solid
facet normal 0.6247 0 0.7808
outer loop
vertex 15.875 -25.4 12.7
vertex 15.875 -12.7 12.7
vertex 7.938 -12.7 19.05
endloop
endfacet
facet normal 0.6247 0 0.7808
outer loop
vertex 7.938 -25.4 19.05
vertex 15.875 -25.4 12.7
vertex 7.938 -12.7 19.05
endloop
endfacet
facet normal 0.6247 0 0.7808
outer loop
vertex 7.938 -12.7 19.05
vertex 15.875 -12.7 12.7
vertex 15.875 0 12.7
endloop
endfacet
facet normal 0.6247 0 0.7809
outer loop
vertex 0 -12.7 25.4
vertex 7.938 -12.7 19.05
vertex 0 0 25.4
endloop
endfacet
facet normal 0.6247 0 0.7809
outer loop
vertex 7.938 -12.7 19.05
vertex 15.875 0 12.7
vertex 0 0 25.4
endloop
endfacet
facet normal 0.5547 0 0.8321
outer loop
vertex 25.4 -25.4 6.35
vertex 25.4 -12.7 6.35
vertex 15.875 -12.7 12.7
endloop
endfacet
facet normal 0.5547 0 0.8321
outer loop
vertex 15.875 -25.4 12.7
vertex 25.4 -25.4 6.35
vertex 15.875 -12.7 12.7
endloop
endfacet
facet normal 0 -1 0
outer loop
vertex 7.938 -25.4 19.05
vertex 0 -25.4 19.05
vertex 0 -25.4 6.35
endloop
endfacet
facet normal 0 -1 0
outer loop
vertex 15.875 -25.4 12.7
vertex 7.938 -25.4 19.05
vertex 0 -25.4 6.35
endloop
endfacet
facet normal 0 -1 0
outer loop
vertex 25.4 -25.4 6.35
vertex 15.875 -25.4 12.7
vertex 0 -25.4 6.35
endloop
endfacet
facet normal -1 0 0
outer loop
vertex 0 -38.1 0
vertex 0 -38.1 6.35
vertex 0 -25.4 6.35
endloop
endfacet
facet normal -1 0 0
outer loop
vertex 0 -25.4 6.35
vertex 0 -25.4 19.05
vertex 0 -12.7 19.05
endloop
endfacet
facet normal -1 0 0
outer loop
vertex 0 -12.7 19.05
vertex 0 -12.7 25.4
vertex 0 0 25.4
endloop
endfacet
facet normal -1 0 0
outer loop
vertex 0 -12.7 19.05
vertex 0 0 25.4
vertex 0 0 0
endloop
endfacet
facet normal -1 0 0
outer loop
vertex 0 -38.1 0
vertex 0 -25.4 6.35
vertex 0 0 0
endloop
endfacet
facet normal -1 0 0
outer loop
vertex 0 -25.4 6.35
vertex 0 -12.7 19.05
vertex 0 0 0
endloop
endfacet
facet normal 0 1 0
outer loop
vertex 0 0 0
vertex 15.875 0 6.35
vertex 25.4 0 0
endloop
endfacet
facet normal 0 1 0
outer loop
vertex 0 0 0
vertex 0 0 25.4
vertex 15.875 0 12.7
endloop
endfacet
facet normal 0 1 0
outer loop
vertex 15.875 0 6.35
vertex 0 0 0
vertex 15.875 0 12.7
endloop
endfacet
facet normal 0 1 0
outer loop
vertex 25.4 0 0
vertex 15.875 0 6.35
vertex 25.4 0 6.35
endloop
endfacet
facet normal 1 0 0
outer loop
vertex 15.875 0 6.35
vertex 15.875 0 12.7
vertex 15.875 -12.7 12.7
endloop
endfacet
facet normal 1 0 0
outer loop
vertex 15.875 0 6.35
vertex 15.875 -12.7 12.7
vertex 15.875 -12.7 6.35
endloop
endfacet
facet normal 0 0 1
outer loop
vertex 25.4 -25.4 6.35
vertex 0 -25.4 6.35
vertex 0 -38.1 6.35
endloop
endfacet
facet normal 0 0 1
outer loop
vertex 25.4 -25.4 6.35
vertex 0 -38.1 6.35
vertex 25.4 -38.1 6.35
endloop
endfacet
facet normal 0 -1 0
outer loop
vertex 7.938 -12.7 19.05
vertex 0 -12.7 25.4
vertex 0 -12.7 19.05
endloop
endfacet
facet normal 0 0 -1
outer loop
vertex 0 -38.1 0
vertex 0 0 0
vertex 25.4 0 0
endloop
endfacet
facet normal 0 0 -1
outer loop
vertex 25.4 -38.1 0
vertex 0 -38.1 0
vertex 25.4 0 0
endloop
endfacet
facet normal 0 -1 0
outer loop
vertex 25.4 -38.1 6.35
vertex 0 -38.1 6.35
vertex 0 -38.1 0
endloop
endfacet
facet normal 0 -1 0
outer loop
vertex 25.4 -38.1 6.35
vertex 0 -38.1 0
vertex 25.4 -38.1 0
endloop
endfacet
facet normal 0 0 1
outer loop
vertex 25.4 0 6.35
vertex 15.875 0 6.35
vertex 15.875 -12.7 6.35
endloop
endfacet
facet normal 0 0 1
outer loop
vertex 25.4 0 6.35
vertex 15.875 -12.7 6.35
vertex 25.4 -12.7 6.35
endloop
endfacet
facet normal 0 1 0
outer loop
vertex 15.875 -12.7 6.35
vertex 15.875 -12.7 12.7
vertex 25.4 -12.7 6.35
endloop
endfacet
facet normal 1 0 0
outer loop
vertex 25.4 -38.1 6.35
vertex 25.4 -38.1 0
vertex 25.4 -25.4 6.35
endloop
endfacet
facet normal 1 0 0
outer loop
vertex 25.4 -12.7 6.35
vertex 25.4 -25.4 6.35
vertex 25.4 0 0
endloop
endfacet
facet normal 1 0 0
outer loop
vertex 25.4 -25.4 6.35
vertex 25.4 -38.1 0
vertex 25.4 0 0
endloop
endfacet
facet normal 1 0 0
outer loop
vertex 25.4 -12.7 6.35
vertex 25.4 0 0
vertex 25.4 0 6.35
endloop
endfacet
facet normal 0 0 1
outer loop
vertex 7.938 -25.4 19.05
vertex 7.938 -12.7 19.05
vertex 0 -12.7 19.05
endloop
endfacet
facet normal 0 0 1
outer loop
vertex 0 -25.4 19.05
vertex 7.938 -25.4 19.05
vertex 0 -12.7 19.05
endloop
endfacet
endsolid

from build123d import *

# Parameters (mm, degrees)
F0_W     = 25.4
F0_H     = 6.35
F1_DEPTH = 38.1
F3_DEPTH = 25.4
F4_DEPTH = 12.7
F6_DEPTH = 25.4
F7_DEPTH = 12.7


with BuildPart() as f1:
    # F0 (on Front) → F1 (new body)
    with BuildSketch(Plane.XZ):
        with Locations((12.7, 3.175)):
            Rectangle(F0_W, F0_H)
    extrude(amount=F1_DEPTH)

    # F2 (on Front) → F3 (join)
    with BuildSketch(Plane.XZ):
        Polygon((0, 19.05), (0, 6.35), (15.875, 6.35), (15.875, 12.7), (7.9375, 19.05), align=None)
    extrude(amount=F3_DEPTH)

    # F2 (on Front) → F4 (join)
    with BuildSketch(Plane.XZ):
        Polygon((0, 25.4), (0, 19.05), (7.9375, 19.05), align=None)
    extrude(amount=F4_DEPTH)

    # F5 (on Front) → F6 (join)
    with BuildSketch(Plane.XZ):
        Polygon((25.4, 6.35), (15.875, 12.7), (15.875, 6.35), align=None)
    extrude(amount=F6_DEPTH)

    # F5 (on Front) → F7 (cut)
    with BuildSketch(Plane.XZ):
        Polygon((25.4, 6.35), (15.875, 12.7), (15.875, 6.35), align=None)
    extrude(amount=F7_DEPTH, mode=Mode.SUBTRACT)


solid = f1.part
